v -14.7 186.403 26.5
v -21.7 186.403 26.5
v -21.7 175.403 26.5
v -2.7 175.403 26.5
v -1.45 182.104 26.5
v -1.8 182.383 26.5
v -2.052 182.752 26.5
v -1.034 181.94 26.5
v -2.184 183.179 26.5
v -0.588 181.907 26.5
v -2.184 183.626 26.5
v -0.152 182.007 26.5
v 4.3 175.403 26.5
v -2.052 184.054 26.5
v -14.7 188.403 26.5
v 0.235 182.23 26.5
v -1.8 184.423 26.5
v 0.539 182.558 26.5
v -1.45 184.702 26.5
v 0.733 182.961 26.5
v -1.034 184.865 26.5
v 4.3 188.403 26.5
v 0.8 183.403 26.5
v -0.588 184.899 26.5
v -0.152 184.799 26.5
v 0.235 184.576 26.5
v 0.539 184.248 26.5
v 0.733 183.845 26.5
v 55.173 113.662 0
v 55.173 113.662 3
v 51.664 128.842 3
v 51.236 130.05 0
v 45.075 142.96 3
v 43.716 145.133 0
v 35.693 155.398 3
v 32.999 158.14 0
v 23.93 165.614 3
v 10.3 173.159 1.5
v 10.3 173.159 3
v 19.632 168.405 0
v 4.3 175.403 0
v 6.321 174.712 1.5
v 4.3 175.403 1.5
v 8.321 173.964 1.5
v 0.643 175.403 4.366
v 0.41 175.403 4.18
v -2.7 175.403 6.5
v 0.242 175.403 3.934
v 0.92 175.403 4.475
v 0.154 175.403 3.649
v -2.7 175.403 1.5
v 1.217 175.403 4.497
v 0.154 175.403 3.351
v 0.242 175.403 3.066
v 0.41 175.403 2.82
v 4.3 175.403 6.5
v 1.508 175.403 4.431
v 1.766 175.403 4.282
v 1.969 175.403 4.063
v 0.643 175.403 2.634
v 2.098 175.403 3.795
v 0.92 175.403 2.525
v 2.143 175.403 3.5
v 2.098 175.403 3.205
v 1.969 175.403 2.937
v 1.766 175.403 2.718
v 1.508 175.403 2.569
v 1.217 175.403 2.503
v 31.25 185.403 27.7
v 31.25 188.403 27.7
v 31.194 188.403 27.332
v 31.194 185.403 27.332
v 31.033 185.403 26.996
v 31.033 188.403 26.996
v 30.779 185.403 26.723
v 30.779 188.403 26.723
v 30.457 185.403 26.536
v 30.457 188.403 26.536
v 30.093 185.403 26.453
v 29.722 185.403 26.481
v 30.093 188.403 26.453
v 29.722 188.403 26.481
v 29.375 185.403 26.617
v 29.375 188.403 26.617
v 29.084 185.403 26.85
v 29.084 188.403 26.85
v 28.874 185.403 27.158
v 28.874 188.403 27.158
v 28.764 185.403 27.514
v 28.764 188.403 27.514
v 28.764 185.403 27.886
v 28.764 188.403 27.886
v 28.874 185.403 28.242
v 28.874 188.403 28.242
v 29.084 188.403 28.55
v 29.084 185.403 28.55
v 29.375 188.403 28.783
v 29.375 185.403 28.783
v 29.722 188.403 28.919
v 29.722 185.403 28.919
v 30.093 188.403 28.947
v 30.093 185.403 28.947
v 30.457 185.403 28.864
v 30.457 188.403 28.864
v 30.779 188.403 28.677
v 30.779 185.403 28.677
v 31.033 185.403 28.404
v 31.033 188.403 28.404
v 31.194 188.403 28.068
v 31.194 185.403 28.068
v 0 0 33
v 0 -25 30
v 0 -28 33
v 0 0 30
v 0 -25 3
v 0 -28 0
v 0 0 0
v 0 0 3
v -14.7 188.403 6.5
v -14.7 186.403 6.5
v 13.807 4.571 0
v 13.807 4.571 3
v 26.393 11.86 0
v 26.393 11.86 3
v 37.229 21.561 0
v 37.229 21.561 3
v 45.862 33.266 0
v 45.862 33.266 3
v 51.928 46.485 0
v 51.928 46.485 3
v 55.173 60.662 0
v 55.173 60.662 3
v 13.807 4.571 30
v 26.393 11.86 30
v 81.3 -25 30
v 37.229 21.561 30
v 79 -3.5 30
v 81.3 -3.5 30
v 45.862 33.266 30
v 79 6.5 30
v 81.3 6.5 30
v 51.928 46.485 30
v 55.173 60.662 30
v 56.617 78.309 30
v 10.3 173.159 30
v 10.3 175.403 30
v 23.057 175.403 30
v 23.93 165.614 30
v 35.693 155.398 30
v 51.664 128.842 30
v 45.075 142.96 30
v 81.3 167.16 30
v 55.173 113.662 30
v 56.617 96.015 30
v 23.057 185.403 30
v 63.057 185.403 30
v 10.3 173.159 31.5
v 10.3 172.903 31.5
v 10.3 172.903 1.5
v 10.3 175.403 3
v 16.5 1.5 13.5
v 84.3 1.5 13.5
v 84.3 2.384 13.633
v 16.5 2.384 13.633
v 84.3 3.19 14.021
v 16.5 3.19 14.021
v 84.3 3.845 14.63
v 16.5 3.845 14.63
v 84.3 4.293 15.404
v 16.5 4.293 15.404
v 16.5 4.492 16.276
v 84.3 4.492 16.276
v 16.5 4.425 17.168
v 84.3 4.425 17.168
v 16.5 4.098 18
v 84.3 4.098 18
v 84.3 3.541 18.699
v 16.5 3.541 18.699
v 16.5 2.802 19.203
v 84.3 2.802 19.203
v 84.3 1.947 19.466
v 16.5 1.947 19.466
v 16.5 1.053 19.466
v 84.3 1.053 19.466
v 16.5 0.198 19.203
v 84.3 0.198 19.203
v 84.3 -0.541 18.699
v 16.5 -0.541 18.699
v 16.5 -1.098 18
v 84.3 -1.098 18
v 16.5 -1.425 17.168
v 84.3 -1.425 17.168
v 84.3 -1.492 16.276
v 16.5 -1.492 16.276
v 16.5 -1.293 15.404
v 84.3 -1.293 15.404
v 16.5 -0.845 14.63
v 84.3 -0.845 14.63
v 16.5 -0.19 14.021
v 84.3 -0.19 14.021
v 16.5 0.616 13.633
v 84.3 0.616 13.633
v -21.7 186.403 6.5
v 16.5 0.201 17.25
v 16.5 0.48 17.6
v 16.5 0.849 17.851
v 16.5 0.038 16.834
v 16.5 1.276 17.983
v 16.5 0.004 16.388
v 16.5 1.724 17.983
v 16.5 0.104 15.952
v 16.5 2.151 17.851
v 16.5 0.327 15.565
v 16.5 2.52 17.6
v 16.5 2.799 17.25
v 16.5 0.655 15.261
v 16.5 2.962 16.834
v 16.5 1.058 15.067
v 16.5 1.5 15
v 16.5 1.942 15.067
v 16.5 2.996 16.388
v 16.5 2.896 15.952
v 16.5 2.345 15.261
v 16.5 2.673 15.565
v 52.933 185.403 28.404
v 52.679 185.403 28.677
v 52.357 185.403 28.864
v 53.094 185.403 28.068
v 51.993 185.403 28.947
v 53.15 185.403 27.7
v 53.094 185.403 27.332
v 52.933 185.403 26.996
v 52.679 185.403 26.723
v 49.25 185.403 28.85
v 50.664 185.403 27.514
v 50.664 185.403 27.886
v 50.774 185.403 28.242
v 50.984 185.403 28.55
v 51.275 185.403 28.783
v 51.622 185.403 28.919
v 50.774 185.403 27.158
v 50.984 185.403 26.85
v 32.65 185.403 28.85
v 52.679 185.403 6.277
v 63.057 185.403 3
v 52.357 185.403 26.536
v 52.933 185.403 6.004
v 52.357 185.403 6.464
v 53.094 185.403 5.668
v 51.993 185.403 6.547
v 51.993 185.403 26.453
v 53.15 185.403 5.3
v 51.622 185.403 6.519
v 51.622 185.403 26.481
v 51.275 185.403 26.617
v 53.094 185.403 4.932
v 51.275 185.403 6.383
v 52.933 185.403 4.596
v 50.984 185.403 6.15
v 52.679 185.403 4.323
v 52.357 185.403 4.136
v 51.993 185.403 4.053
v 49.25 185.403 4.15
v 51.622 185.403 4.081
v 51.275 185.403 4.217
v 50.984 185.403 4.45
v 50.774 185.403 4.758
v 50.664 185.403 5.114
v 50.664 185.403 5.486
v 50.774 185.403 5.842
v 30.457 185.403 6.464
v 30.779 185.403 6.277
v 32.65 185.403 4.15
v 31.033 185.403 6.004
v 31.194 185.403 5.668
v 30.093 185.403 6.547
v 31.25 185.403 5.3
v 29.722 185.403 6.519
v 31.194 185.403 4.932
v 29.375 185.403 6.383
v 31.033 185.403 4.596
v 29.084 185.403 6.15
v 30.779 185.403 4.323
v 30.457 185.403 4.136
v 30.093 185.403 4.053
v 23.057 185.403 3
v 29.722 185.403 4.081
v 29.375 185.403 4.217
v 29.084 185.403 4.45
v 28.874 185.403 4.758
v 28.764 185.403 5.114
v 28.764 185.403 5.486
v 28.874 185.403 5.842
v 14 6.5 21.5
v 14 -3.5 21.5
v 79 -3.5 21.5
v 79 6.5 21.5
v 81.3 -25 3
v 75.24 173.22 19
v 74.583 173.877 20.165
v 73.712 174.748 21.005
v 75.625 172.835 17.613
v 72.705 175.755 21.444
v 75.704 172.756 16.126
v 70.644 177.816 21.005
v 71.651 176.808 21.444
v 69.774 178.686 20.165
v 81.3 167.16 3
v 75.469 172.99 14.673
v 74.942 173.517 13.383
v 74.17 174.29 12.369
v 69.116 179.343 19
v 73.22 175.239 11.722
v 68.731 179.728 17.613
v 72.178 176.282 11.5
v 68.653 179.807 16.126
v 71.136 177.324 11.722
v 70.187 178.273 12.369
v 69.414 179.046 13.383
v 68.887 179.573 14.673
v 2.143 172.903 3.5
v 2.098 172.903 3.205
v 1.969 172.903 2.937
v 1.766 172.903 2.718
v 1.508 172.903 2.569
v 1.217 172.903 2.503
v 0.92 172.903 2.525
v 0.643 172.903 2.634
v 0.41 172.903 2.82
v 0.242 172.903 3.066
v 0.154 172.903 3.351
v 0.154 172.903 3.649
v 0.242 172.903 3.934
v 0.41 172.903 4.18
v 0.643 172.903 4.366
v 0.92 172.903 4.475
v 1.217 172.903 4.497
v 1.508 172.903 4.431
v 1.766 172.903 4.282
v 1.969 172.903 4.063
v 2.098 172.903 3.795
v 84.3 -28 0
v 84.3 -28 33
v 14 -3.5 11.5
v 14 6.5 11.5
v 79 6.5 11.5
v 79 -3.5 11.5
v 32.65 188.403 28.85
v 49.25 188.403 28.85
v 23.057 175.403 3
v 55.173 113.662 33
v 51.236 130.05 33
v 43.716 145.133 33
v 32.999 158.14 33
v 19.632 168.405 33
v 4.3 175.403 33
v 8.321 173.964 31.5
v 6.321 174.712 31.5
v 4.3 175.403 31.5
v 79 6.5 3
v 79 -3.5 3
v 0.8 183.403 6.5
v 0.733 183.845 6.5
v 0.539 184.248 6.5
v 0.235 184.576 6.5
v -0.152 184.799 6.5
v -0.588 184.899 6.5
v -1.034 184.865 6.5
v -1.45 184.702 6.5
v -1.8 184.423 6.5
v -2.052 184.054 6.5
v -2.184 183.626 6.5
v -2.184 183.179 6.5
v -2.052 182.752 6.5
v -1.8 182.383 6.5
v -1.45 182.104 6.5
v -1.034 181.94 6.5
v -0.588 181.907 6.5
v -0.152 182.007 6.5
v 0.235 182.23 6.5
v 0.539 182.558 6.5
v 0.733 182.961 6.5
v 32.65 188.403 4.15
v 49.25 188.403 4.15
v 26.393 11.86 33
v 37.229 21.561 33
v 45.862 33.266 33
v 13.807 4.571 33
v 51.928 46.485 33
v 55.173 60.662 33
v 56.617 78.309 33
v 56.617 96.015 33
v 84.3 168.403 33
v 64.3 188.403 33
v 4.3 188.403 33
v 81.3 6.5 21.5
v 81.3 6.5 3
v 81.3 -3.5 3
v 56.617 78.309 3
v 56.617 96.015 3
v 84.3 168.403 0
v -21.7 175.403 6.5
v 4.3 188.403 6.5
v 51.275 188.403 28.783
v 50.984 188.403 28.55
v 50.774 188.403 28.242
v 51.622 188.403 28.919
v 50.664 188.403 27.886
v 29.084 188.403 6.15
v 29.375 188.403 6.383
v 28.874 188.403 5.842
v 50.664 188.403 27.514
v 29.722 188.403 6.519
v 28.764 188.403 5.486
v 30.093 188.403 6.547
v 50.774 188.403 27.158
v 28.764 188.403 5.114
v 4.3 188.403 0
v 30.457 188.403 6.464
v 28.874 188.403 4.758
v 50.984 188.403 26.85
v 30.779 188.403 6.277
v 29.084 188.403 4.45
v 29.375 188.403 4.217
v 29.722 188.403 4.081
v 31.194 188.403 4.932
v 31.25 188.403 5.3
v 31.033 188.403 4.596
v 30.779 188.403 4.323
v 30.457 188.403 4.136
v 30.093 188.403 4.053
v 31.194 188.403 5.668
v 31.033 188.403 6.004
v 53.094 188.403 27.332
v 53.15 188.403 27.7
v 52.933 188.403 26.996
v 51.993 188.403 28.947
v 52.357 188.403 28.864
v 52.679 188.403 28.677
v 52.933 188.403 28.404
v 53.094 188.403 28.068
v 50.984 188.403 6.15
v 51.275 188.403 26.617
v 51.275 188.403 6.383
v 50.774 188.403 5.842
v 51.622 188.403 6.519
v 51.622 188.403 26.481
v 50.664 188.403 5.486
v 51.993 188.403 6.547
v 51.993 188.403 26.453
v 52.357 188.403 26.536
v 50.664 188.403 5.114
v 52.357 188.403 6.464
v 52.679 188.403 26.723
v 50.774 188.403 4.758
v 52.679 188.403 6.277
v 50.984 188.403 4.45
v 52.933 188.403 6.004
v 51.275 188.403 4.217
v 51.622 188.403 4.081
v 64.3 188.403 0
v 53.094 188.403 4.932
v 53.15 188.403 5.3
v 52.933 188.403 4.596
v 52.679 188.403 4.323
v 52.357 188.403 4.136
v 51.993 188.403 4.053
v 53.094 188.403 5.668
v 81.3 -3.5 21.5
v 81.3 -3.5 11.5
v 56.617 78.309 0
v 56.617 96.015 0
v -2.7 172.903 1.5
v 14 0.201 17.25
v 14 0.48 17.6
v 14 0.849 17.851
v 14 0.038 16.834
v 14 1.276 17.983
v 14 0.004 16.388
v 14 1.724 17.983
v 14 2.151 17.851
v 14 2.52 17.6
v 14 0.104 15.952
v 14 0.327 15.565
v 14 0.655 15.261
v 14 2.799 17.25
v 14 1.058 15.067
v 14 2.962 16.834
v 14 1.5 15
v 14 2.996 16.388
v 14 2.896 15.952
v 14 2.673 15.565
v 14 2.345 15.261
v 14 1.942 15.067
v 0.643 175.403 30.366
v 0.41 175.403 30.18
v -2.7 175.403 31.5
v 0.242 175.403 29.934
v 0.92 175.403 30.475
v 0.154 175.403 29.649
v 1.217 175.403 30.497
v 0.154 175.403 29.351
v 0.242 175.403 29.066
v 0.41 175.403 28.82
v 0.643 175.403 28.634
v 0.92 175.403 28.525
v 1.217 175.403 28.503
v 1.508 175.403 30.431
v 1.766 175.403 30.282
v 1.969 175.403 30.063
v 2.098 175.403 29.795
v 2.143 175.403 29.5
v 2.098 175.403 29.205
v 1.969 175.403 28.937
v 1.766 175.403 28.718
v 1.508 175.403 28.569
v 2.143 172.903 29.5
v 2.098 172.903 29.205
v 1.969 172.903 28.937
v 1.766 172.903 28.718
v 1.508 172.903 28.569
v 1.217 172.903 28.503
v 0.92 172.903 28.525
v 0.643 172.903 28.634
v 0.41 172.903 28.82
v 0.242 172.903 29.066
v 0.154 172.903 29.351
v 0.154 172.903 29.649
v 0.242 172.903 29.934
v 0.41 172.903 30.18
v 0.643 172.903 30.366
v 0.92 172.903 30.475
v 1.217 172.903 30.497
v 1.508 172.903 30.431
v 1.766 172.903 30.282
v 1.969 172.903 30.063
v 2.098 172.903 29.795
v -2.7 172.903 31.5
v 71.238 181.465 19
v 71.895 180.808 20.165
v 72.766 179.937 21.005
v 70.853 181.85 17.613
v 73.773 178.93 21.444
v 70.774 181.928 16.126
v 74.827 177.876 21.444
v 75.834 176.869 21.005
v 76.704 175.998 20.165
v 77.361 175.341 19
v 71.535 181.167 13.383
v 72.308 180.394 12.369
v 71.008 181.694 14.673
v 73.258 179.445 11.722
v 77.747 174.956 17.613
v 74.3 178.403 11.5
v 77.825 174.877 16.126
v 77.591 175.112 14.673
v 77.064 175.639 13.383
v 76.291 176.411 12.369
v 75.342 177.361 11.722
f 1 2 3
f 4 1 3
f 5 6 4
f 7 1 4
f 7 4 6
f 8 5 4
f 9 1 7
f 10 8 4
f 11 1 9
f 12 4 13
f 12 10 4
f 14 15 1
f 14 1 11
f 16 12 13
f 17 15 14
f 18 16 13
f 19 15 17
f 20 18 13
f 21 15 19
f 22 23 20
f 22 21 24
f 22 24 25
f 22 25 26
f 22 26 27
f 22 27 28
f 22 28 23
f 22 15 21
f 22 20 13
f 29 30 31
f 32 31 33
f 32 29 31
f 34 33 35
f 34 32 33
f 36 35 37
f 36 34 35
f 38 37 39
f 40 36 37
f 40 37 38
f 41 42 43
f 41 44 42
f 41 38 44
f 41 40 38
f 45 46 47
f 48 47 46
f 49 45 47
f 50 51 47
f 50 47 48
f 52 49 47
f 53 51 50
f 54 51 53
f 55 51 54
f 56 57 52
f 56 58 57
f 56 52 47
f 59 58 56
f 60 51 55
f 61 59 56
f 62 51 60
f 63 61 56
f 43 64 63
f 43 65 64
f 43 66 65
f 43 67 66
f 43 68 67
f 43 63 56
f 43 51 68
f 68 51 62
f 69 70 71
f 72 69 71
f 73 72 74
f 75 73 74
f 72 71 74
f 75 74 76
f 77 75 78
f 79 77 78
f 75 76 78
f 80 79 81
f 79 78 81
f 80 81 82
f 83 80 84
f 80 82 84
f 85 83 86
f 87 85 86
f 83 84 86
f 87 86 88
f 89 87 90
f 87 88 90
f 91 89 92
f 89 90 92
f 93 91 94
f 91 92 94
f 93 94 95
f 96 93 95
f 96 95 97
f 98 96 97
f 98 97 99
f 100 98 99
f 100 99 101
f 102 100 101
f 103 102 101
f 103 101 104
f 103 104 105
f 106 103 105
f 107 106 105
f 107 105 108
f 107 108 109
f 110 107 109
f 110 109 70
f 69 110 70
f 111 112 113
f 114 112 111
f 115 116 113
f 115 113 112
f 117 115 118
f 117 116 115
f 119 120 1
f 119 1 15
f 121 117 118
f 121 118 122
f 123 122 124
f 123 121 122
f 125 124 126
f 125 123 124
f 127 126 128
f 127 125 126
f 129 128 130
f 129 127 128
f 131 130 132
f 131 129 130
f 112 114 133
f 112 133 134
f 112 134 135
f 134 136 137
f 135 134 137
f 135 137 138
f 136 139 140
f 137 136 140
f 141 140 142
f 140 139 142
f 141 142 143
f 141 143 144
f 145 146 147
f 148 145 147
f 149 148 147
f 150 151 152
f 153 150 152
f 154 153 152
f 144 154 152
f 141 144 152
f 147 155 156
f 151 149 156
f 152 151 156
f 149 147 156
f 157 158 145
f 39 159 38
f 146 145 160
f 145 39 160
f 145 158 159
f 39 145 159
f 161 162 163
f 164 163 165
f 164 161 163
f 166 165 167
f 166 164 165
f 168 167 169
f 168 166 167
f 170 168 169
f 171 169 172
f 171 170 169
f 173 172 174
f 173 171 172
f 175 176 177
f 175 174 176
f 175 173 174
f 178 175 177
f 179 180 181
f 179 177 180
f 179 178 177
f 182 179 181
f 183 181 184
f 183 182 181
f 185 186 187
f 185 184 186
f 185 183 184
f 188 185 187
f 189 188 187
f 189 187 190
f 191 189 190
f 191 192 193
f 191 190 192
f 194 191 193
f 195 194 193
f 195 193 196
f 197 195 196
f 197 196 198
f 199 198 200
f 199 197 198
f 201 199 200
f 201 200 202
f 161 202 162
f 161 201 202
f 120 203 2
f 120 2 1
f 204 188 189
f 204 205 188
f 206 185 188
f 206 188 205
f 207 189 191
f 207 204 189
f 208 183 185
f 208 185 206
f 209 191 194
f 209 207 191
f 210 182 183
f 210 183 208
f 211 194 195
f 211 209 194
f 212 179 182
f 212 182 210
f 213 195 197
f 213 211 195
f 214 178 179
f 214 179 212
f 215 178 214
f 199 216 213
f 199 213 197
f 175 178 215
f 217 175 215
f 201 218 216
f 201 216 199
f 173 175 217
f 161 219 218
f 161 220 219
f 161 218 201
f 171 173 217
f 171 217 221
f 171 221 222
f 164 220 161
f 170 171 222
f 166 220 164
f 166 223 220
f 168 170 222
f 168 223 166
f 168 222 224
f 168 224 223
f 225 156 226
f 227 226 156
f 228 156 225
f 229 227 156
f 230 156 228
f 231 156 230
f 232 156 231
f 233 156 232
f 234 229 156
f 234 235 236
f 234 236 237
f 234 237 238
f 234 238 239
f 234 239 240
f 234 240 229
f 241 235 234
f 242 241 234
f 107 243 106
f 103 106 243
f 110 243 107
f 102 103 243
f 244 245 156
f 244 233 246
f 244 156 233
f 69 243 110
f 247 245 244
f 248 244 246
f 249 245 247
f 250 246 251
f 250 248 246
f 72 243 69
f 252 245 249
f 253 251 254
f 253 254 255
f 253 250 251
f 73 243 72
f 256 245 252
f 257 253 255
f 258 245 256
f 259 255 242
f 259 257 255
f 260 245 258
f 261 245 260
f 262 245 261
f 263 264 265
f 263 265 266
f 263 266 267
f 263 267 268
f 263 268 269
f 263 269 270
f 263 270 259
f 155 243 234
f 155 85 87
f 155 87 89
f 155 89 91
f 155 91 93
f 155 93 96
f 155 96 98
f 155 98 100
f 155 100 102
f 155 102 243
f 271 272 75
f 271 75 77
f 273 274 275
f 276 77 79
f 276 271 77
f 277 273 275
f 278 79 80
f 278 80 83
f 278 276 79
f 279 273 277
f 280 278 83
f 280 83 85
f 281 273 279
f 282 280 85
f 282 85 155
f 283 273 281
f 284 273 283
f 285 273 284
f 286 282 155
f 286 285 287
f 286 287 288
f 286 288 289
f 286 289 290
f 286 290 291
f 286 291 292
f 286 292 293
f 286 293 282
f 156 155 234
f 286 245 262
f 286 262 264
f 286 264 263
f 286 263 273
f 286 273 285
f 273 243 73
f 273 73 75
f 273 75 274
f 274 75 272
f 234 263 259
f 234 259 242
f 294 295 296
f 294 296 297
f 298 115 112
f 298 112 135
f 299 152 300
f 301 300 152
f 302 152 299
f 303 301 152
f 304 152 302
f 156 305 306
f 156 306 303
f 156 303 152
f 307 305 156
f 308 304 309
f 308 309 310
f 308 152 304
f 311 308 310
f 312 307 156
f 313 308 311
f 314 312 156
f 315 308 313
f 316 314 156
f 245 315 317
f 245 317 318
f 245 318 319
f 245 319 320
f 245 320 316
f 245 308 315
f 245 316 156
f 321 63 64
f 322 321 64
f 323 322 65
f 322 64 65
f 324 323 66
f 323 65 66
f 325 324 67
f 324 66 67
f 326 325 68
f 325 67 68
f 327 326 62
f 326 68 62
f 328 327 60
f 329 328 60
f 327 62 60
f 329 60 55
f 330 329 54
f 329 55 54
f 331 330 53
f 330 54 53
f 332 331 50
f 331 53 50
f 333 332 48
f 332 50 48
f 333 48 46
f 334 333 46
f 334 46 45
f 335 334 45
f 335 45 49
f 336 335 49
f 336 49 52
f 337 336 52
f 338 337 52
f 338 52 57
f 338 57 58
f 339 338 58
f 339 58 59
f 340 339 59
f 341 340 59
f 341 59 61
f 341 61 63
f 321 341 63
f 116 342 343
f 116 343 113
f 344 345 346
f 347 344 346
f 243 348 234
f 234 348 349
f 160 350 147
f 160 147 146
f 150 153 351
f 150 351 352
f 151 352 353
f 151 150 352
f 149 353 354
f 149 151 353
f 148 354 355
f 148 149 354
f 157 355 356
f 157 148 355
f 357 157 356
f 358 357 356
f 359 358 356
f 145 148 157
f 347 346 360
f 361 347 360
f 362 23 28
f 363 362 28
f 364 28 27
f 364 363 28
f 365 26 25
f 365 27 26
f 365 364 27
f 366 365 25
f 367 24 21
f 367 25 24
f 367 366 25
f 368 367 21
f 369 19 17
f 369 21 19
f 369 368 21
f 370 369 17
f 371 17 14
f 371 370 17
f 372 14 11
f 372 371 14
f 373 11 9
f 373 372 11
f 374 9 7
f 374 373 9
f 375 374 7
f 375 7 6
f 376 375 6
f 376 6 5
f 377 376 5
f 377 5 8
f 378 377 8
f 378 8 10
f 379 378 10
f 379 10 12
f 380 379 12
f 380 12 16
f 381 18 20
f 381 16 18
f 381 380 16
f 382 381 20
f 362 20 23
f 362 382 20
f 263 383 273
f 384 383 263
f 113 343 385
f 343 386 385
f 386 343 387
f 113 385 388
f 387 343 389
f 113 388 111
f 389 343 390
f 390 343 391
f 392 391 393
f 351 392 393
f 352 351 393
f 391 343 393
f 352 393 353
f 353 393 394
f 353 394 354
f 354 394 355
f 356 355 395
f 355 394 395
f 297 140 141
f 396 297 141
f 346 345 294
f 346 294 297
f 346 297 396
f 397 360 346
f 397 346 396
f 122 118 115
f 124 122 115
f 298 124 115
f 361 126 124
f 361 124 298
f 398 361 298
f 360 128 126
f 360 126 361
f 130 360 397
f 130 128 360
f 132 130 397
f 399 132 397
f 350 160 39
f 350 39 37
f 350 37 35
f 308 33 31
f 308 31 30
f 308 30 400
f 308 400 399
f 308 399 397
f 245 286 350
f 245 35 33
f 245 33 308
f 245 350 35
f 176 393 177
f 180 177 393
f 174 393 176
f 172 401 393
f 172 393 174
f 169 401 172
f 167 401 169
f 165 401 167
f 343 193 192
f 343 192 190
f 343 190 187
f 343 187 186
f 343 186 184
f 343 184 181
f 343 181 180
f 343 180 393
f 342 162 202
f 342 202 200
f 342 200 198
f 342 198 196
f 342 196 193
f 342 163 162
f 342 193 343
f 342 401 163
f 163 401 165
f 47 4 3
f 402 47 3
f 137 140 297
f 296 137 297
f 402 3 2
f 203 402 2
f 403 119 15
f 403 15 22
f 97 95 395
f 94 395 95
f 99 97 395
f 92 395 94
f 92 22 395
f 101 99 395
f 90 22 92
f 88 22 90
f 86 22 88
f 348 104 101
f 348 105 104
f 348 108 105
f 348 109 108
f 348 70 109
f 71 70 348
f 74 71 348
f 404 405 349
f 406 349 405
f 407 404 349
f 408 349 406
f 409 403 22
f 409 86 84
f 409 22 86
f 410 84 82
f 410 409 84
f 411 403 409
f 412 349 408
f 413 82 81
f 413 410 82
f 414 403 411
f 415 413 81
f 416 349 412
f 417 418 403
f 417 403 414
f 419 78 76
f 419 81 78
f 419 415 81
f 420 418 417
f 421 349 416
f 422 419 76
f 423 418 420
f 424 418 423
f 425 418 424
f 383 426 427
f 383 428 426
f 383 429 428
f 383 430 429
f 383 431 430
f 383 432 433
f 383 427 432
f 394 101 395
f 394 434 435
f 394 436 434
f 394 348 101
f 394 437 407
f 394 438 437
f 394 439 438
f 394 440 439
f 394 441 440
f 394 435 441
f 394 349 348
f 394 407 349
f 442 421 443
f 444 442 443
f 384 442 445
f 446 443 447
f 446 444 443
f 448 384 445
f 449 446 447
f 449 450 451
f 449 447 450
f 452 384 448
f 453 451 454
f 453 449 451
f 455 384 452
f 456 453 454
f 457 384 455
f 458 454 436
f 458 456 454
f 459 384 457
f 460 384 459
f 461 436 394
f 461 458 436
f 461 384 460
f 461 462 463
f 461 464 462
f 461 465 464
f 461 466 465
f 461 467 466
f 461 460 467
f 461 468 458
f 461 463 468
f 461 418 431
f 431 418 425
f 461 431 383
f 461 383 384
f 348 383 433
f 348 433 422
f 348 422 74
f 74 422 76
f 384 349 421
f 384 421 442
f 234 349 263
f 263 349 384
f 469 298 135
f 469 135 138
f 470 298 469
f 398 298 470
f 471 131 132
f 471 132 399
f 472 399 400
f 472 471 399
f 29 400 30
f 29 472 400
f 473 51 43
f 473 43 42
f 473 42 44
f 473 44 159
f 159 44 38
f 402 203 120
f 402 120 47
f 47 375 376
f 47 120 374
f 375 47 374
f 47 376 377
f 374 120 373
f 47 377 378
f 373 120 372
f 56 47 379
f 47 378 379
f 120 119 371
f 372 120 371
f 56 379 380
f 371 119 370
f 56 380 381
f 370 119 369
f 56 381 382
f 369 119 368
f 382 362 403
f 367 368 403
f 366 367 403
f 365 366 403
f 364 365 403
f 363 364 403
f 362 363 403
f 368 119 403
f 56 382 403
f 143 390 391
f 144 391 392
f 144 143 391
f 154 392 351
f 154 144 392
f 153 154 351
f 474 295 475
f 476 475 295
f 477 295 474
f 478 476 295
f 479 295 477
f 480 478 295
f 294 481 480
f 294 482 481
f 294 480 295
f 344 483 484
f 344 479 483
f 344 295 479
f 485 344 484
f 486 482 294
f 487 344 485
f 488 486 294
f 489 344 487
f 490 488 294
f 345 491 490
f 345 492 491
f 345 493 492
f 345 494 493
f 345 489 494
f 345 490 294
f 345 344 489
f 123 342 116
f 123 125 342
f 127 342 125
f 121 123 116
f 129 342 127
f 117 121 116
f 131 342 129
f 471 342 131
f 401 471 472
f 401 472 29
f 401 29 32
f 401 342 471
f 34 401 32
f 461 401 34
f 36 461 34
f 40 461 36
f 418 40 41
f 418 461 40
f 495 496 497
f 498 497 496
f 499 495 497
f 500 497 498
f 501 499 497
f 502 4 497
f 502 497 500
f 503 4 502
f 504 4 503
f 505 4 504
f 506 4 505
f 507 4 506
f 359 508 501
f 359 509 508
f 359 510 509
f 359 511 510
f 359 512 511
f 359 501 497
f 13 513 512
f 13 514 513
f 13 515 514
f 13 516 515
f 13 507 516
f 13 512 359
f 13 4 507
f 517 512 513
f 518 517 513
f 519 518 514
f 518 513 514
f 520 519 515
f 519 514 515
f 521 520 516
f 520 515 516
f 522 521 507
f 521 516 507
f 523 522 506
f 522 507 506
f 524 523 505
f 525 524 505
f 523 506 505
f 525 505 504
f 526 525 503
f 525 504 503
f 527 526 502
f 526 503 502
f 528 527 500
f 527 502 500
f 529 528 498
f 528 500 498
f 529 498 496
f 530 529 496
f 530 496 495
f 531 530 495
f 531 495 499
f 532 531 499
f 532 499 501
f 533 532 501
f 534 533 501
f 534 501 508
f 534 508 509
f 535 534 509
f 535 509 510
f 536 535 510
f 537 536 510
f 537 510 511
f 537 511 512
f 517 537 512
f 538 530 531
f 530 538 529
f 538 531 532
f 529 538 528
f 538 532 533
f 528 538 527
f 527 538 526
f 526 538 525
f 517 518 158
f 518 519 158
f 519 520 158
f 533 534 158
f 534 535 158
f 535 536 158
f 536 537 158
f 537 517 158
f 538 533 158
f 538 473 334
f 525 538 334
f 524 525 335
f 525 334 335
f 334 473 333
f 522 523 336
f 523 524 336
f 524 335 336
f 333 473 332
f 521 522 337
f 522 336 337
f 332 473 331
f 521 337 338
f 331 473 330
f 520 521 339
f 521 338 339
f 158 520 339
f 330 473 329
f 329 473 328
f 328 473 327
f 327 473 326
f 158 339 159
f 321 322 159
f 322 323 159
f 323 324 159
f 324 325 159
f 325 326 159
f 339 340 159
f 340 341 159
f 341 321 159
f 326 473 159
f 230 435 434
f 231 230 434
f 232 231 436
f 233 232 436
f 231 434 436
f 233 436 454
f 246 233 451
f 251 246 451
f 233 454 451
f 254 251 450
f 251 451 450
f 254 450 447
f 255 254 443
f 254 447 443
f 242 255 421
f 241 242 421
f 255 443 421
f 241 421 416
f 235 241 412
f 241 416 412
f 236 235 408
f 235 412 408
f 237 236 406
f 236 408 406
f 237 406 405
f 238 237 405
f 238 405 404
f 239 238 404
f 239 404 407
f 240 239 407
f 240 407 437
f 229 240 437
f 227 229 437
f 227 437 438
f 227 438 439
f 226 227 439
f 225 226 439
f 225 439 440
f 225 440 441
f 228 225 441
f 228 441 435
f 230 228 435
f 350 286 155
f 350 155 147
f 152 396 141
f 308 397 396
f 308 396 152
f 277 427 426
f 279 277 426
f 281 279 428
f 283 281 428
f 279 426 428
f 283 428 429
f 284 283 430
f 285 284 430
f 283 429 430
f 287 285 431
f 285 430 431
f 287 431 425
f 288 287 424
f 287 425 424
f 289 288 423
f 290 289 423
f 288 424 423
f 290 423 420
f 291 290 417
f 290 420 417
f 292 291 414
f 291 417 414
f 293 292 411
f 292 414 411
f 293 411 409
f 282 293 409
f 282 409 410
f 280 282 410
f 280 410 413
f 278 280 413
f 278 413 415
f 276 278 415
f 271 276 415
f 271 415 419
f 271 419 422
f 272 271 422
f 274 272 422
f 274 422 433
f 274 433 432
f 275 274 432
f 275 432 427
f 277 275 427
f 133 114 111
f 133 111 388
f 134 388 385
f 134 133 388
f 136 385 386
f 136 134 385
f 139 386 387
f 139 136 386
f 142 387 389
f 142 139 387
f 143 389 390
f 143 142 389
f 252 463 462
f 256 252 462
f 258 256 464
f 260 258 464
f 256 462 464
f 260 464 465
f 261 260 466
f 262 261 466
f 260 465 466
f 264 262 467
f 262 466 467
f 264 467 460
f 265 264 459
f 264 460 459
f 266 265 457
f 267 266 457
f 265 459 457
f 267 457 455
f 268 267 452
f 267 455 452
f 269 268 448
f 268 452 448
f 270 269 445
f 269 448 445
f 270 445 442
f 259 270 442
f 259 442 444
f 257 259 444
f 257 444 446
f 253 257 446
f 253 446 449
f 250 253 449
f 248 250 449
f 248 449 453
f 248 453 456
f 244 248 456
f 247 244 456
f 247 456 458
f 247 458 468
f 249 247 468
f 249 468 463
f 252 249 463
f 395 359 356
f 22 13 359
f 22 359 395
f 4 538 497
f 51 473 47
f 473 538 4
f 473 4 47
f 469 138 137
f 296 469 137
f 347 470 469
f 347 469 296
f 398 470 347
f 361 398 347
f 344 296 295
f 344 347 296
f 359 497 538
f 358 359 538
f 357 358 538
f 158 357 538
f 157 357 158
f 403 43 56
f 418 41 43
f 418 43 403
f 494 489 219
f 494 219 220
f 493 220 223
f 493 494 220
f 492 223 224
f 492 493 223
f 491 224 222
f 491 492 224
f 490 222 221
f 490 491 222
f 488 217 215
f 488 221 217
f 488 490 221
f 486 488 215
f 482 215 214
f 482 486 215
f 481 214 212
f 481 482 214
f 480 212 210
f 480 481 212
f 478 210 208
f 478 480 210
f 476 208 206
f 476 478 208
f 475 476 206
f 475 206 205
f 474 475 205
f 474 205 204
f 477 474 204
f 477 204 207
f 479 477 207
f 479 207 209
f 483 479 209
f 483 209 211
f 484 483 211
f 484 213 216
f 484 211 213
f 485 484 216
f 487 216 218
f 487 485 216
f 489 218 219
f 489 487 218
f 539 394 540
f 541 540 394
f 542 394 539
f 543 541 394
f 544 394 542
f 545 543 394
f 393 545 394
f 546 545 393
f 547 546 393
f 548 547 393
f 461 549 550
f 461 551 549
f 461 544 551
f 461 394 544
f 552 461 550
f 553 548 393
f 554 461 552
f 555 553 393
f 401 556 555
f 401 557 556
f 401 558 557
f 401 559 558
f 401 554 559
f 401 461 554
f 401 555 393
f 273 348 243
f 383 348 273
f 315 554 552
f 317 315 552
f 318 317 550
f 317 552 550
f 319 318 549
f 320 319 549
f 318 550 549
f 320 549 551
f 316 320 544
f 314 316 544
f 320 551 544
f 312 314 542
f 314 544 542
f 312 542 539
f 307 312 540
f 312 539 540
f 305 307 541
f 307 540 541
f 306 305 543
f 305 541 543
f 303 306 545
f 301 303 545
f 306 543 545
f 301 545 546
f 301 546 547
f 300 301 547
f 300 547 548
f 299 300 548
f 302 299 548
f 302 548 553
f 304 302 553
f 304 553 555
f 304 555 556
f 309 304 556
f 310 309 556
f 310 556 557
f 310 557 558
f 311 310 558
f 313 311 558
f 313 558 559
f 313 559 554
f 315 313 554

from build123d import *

# Parameters (mm, degrees)
EXTRUDE_6_DEPTH      = 33
CUT_EXTRUDE_START    = 3
CUT_EXTRUDE_2_DEPTH  = 27
EXTRUDE_START        = 6.5
SKETCH_7_W           = 26
SKETCH_7_H           = 13
EXTRUDE_7_DEPTH      = 20
EXTRUDE_START_2      = 1.5
SKETCH_11_W          = 13
SKETCH_11_H          = 2.5
EXTRUDE_15_DEPTH     = 30
CUT_EXTRUDE_START_2  = 180
SKETCH_12_R          = 1
CUT_EXTRUDE_3_DEPTH  = 10
SKETCH_13_R          = 1.5
CUT_EXTRUDE_4_DEPTH  = 30
SKETCH_14_W          = 7
SKETCH_14_H          = 2
CUT_EXTRUDE_5_DEPTH  = 30
EXTRUDE_START_3      = 11.5
SKETCH_15_W          = 67.299618531
SKETCH_15_H          = 10
EXTRUDE_16_DEPTH     = 10
SKETCH_16_W          = 8.5
SKETCH_16_H          = 10
CUT_EXTRUDE_6_DEPTH  = 79
CUT_EXTRUDE_START_3  = 16.5
SKETCH_17_R          = 3
CUT_EXTRUDE_7_DEPTH  = 75
CUT_EXTRUDE_START_4  = 13
SKETCH_18_R          = 1.5
CUT_EXTRUDE_9_DEPTH  = 5
SKETCH_20_R          = 1.25
SKETCH_20_W          = 16.6
SKETCH_20_H          = 24.7
CUT_EXTRUDE_10_DEPTH = 5
SKETCH_21_R          = 5
CUT_EXTRUDE_11_DEPTH = 5


with BuildPart() as part:
    # Эскиз1 → Бобышка-Вытянуть6 (new body)
    with BuildSketch(Plane.XY):
        with BuildLine():
            Line((4.299618531, 175.402841826), (4.299618531, 188.402841826))
            Line((4.299618531, 188.402841826), (64.299618531, 188.402841826))
            Line((64.299618531, 188.402841826), (84.299618531, 168.402841826))
            Line((84.299618531, 168.402841826), (84.299618531, 0))
            Line((84.299618531, 0), (84.299618531, -28))
            Line((84.299618531, -28), (0, -28))
            Line((0, -28), (0, 0))
            ThreePointArc((0, 0), (37.229295141, 21.561020186), (55.173142182, 60.662380285))
            ThreePointArc((55.173142182, 60.662380285), (56.797307883, 87.162380285), (55.173142182, 113.662380285))
            ThreePointArc((55.173142182, 113.662380285), (38.726552267, 151.940422917), (4.299618531, 175.402841826))
        make_face()
    extrude(amount=EXTRUDE_6_DEPTH)

    # Эскиз5 → Вырез-Вытянуть2 (cut)
    with BuildSketch(Plane.XY.offset(CUT_EXTRUDE_START)):
        Polygon((-18.700381469, -25), (81.299618531, -25), (81.299618531, -3.5), (14, -3.5), (14, 6.5), (81.299618531, 6.5), (81.299618531, 167.160201139), (63.056977844, 185.402841826), (23.056977844, 185.402841826), (23.056977844, 175.402841826), (4.299618531, 175.402841826), (6.299618531, 167.160201139), (-18.700381469, 167.160201139), align=None)
    extrude(amount=CUT_EXTRUDE_2_DEPTH, mode=Mode.SUBTRACT)

    # Эскиз7 → Бобышка-Вытянуть7 (add)
    with BuildSketch(Plane.XY.offset(EXTRUDE_START)):
        with Locations((-8.700381469, 181.902841826)):
            Rectangle(SKETCH_7_W, SKETCH_7_H)
    extrude(amount=EXTRUDE_7_DEPTH)

    # Эскиз11 → Бобышка-Вытянуть15 (add)
    with BuildSketch(Plane.XY.offset(EXTRUDE_START_2)):
        with Locations((3.799618531, 174.152841826)):
            Rectangle(SKETCH_11_W, SKETCH_11_H)
    extrude(amount=EXTRUDE_15_DEPTH)

    # Эскиз12 → Вырез-Вытянуть3 (cut)
    with BuildSketch(Plane(origin=(0, 0, 0), x_dir=(1, 0, 0), z_dir=(0, 1, 0)).offset(CUT_EXTRUDE_START_2)):
        with Locations((1.142696527, -3.5)):
            Circle(SKETCH_12_R)
        with Locations((1.142696527, -29.5)):
            Circle(SKETCH_12_R)
    extrude(amount=-CUT_EXTRUDE_3_DEPTH, mode=Mode.SUBTRACT)

    # Эскиз13 → Вырез-Вытянуть4 (cut)
    with BuildSketch(Plane.XY):
        with Locations((-0.700381469, 183.402841826)):
            Circle(SKETCH_13_R)
    extrude(amount=CUT_EXTRUDE_4_DEPTH, mode=Mode.SUBTRACT)

    # Эскиз14 → Вырез-Вытянуть5 (cut)
    with BuildSketch(Plane.XY):
        with Locations((-18.200381469, 187.402841826)):
            Rectangle(SKETCH_14_W, SKETCH_14_H)
    extrude(amount=CUT_EXTRUDE_5_DEPTH, mode=Mode.SUBTRACT)

    # Эскиз15 → Бобышка-Вытянуть16 (add)
    with BuildSketch(Plane.XY.offset(EXTRUDE_START_3)):
        with Locations((47.649809266, 1.5)):
            Rectangle(SKETCH_15_W, SKETCH_15_H)
    extrude(amount=EXTRUDE_16_DEPTH)

    # Эскиз16 → Вырез-Вытянуть6 (cut)
    with BuildSketch(Plane(origin=(0, 0, 0), x_dir=(0, 0, -1), z_dir=(1, 0, 0))):
        with Locations((-7.25, 1.5)):
            Rectangle(SKETCH_16_W, SKETCH_16_H)
        with Locations((-25.75, 1.5)):
            Rectangle(SKETCH_16_W, SKETCH_16_H)
    extrude(amount=CUT_EXTRUDE_6_DEPTH, mode=Mode.SUBTRACT)

    # Эскиз17 → Вырез-Вытянуть7 (cut)
    with BuildSketch(Plane(origin=(0, 0, 0), x_dir=(0, 0, -1), z_dir=(1, 0, 0)).offset(CUT_EXTRUDE_START_3)):
        with Locations((-16.5, 1.5)):
            Circle(SKETCH_17_R)
    extrude(amount=CUT_EXTRUDE_7_DEPTH, mode=Mode.SUBTRACT)

    # Эскиз18 → Вырез-Вытянуть9 (cut)
    with BuildSketch(Plane(origin=(0, 0, 0), x_dir=(0, 0, -1), z_dir=(1, 0, 0)).offset(CUT_EXTRUDE_START_4)):
        with Locations((-16.5, 1.5)):
            Circle(SKETCH_18_R)
    extrude(amount=CUT_EXTRUDE_9_DEPTH, mode=Mode.SUBTRACT)

    # Эскиз20 → Вырез-Вытянуть10 (cut)
    with BuildSketch(Plane(origin=(0, 188.402841826, 0), x_dir=(1, 0, 0), z_dir=(0, 1, 0))):
        with Locations((51.9, -5.3)):
            Circle(SKETCH_20_R)
        with Locations((51.9, -27.7)):
            Circle(SKETCH_20_R)
        with Locations((30, -5.3)):
            Circle(SKETCH_20_R)
        with Locations((30, -27.7)):
            Circle(SKETCH_20_R)
        with Locations((40.95, -16.5)):
            Rectangle(SKETCH_20_W, SKETCH_20_H)
    extrude(amount=-CUT_EXTRUDE_10_DEPTH, mode=Mode.SUBTRACT)

    # Эскиз21 → Вырез-Вытянуть11 (cut)
    with BuildSketch(Plane(origin=(126.351230179, 126.351230179, 0), x_dir=(0, 0, -1), z_dir=(0.707106781, 0.707106781, 0))):
        with Locations((-16.5, 73.612095136)):
            Circle(SKETCH_21_R)
    extrude(amount=-CUT_EXTRUDE_11_DEPTH, mode=Mode.SUBTRACT)


solid = part.part
